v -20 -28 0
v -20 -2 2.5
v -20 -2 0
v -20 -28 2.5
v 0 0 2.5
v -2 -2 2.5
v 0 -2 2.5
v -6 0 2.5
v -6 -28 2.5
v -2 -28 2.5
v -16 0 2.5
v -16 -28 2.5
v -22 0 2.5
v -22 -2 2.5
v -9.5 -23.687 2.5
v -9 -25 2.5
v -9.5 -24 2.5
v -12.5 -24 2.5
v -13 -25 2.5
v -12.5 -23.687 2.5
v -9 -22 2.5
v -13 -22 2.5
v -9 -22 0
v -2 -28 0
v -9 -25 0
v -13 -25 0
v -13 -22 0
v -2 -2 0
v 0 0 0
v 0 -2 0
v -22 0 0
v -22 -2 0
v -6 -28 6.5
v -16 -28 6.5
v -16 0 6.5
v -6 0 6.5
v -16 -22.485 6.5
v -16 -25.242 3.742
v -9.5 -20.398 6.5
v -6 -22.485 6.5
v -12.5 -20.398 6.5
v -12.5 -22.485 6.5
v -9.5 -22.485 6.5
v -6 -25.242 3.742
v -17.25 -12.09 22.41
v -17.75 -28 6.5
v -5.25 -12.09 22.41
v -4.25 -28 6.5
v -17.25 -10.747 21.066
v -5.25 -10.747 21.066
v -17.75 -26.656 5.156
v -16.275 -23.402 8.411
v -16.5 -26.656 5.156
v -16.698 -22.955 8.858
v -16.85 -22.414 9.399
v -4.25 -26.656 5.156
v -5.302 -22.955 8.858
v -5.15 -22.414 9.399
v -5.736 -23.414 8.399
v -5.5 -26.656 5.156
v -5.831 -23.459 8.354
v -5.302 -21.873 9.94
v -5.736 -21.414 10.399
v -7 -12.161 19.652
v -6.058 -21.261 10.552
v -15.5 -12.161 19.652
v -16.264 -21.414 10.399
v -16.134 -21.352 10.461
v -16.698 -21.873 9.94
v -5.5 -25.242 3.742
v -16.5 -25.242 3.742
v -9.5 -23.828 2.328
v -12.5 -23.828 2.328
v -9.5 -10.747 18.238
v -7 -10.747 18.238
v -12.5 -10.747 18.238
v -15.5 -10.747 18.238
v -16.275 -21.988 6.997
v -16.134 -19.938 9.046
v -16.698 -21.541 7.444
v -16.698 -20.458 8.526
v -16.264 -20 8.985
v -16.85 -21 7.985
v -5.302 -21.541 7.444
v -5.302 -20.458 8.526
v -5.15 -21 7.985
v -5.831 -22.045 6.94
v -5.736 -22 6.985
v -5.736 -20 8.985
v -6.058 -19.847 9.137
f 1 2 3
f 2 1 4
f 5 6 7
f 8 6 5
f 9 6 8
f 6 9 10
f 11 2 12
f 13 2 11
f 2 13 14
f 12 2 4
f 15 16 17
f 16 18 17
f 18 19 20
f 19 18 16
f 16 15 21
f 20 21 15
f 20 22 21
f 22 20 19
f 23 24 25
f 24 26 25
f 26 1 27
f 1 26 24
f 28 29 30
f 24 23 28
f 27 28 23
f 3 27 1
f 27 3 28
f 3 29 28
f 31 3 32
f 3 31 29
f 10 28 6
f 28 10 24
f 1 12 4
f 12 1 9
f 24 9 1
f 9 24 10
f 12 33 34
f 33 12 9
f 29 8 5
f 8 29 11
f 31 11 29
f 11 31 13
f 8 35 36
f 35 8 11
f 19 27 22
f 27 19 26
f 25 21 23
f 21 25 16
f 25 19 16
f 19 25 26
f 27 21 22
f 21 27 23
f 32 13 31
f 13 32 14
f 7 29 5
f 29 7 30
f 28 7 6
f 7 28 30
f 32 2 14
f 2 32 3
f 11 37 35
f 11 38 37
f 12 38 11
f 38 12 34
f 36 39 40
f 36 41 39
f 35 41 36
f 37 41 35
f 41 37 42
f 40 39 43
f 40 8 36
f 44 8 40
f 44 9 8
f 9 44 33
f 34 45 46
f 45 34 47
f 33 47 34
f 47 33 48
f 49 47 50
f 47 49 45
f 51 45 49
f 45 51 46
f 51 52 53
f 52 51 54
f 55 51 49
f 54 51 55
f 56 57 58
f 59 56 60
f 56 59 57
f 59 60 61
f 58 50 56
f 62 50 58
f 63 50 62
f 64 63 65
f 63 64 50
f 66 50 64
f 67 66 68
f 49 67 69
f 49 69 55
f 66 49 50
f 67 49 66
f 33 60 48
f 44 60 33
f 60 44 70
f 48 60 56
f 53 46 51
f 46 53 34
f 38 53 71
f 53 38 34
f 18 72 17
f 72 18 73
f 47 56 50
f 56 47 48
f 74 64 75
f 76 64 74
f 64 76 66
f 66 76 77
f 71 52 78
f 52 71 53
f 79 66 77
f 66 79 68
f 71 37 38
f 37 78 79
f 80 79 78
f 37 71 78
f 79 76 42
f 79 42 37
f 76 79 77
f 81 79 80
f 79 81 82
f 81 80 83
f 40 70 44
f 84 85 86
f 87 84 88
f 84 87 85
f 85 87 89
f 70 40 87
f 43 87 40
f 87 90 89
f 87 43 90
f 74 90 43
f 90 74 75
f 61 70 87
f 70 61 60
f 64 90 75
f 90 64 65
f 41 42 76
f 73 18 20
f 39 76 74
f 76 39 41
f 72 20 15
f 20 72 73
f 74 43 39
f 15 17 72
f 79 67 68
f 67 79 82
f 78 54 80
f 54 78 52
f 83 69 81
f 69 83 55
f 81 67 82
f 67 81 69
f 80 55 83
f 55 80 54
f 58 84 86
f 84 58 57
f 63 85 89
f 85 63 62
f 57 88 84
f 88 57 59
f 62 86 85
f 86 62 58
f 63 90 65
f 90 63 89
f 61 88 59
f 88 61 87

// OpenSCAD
module flap() 
{
    h = 1.9;
    b = 13.5;
    l = 22.5;
    p = [[0, 0, 0], [0, l, 0.5], [0, l, b-1], [0, 0, b],
         [h, 0, 0], [h, l, 0.5], [h, l, b-1], [h, 0, b]];
    f = [[0, 1, 2, 3], [4, 5, 1, 0], [7, 6, 5, 4], 
         [5, 6, 2, 1], [6, 7, 3, 2], [7, 4, 0 ,3]];
    p2 = [[h, 0, 1.25], [h, l-2, 2.25], [h, l-2, b-2.75], [h, 0, b-1.25],
          [h+2, 0, 1.25], [h+2, l-2, 2.25], [h+2, l-2, b-2.75], [h+2, 0, b-1.25]];
    p3 = [[h+2, 0, b/2-1.5], [h+2, l-2, b/2-1.5], [h+2, l-2, b/2+1.5], [h+2, 0, b/2+1.5], 
          [h+4, 0, b/2-1.5], [h+2, l-2, b/2-1.5], [h+2, l-2, b/2+1.5], [h+4, 0, b/2+1.5]];
    polyhedron(points = p, faces= f);
    polyhedron(points = p2, faces= f);
    polyhedron(points = p3, faces= f);
     
    translate([0, 6, 2.9])
    rotate([0, 90, 0])cylinder(h+2, 2, 2, $fn=16);
    translate([0, 6, b-2.9])
    rotate([0, 90, 0])cylinder(h+2, 2, 2, $fn=16);

}
module adapter1() {
    l = 28;
    b = 22;
    h = 2.5;
    translate([2, 0, 0]) difference(){
        cube([b-4, l, h]);
        translate ([7, 22, 0]) cube([4, 3, h]);
    }
    cube([b, 2, h]);
    //p = (
    translate([6.0, 0, 2.5]) cube([10, l, 4]);
}

module cuberider()
{  
  rotate([0,0, 180]) adapter1();  
  //rotate([45,0,0]) {rotate([0, 270, 0]) flap();};   
}
  
//adapter1();
cuberider();
translate([-17.75, -28, 6.5]) rotate([45,0,0]) {rotate([0, 90, 0]) flap();};
